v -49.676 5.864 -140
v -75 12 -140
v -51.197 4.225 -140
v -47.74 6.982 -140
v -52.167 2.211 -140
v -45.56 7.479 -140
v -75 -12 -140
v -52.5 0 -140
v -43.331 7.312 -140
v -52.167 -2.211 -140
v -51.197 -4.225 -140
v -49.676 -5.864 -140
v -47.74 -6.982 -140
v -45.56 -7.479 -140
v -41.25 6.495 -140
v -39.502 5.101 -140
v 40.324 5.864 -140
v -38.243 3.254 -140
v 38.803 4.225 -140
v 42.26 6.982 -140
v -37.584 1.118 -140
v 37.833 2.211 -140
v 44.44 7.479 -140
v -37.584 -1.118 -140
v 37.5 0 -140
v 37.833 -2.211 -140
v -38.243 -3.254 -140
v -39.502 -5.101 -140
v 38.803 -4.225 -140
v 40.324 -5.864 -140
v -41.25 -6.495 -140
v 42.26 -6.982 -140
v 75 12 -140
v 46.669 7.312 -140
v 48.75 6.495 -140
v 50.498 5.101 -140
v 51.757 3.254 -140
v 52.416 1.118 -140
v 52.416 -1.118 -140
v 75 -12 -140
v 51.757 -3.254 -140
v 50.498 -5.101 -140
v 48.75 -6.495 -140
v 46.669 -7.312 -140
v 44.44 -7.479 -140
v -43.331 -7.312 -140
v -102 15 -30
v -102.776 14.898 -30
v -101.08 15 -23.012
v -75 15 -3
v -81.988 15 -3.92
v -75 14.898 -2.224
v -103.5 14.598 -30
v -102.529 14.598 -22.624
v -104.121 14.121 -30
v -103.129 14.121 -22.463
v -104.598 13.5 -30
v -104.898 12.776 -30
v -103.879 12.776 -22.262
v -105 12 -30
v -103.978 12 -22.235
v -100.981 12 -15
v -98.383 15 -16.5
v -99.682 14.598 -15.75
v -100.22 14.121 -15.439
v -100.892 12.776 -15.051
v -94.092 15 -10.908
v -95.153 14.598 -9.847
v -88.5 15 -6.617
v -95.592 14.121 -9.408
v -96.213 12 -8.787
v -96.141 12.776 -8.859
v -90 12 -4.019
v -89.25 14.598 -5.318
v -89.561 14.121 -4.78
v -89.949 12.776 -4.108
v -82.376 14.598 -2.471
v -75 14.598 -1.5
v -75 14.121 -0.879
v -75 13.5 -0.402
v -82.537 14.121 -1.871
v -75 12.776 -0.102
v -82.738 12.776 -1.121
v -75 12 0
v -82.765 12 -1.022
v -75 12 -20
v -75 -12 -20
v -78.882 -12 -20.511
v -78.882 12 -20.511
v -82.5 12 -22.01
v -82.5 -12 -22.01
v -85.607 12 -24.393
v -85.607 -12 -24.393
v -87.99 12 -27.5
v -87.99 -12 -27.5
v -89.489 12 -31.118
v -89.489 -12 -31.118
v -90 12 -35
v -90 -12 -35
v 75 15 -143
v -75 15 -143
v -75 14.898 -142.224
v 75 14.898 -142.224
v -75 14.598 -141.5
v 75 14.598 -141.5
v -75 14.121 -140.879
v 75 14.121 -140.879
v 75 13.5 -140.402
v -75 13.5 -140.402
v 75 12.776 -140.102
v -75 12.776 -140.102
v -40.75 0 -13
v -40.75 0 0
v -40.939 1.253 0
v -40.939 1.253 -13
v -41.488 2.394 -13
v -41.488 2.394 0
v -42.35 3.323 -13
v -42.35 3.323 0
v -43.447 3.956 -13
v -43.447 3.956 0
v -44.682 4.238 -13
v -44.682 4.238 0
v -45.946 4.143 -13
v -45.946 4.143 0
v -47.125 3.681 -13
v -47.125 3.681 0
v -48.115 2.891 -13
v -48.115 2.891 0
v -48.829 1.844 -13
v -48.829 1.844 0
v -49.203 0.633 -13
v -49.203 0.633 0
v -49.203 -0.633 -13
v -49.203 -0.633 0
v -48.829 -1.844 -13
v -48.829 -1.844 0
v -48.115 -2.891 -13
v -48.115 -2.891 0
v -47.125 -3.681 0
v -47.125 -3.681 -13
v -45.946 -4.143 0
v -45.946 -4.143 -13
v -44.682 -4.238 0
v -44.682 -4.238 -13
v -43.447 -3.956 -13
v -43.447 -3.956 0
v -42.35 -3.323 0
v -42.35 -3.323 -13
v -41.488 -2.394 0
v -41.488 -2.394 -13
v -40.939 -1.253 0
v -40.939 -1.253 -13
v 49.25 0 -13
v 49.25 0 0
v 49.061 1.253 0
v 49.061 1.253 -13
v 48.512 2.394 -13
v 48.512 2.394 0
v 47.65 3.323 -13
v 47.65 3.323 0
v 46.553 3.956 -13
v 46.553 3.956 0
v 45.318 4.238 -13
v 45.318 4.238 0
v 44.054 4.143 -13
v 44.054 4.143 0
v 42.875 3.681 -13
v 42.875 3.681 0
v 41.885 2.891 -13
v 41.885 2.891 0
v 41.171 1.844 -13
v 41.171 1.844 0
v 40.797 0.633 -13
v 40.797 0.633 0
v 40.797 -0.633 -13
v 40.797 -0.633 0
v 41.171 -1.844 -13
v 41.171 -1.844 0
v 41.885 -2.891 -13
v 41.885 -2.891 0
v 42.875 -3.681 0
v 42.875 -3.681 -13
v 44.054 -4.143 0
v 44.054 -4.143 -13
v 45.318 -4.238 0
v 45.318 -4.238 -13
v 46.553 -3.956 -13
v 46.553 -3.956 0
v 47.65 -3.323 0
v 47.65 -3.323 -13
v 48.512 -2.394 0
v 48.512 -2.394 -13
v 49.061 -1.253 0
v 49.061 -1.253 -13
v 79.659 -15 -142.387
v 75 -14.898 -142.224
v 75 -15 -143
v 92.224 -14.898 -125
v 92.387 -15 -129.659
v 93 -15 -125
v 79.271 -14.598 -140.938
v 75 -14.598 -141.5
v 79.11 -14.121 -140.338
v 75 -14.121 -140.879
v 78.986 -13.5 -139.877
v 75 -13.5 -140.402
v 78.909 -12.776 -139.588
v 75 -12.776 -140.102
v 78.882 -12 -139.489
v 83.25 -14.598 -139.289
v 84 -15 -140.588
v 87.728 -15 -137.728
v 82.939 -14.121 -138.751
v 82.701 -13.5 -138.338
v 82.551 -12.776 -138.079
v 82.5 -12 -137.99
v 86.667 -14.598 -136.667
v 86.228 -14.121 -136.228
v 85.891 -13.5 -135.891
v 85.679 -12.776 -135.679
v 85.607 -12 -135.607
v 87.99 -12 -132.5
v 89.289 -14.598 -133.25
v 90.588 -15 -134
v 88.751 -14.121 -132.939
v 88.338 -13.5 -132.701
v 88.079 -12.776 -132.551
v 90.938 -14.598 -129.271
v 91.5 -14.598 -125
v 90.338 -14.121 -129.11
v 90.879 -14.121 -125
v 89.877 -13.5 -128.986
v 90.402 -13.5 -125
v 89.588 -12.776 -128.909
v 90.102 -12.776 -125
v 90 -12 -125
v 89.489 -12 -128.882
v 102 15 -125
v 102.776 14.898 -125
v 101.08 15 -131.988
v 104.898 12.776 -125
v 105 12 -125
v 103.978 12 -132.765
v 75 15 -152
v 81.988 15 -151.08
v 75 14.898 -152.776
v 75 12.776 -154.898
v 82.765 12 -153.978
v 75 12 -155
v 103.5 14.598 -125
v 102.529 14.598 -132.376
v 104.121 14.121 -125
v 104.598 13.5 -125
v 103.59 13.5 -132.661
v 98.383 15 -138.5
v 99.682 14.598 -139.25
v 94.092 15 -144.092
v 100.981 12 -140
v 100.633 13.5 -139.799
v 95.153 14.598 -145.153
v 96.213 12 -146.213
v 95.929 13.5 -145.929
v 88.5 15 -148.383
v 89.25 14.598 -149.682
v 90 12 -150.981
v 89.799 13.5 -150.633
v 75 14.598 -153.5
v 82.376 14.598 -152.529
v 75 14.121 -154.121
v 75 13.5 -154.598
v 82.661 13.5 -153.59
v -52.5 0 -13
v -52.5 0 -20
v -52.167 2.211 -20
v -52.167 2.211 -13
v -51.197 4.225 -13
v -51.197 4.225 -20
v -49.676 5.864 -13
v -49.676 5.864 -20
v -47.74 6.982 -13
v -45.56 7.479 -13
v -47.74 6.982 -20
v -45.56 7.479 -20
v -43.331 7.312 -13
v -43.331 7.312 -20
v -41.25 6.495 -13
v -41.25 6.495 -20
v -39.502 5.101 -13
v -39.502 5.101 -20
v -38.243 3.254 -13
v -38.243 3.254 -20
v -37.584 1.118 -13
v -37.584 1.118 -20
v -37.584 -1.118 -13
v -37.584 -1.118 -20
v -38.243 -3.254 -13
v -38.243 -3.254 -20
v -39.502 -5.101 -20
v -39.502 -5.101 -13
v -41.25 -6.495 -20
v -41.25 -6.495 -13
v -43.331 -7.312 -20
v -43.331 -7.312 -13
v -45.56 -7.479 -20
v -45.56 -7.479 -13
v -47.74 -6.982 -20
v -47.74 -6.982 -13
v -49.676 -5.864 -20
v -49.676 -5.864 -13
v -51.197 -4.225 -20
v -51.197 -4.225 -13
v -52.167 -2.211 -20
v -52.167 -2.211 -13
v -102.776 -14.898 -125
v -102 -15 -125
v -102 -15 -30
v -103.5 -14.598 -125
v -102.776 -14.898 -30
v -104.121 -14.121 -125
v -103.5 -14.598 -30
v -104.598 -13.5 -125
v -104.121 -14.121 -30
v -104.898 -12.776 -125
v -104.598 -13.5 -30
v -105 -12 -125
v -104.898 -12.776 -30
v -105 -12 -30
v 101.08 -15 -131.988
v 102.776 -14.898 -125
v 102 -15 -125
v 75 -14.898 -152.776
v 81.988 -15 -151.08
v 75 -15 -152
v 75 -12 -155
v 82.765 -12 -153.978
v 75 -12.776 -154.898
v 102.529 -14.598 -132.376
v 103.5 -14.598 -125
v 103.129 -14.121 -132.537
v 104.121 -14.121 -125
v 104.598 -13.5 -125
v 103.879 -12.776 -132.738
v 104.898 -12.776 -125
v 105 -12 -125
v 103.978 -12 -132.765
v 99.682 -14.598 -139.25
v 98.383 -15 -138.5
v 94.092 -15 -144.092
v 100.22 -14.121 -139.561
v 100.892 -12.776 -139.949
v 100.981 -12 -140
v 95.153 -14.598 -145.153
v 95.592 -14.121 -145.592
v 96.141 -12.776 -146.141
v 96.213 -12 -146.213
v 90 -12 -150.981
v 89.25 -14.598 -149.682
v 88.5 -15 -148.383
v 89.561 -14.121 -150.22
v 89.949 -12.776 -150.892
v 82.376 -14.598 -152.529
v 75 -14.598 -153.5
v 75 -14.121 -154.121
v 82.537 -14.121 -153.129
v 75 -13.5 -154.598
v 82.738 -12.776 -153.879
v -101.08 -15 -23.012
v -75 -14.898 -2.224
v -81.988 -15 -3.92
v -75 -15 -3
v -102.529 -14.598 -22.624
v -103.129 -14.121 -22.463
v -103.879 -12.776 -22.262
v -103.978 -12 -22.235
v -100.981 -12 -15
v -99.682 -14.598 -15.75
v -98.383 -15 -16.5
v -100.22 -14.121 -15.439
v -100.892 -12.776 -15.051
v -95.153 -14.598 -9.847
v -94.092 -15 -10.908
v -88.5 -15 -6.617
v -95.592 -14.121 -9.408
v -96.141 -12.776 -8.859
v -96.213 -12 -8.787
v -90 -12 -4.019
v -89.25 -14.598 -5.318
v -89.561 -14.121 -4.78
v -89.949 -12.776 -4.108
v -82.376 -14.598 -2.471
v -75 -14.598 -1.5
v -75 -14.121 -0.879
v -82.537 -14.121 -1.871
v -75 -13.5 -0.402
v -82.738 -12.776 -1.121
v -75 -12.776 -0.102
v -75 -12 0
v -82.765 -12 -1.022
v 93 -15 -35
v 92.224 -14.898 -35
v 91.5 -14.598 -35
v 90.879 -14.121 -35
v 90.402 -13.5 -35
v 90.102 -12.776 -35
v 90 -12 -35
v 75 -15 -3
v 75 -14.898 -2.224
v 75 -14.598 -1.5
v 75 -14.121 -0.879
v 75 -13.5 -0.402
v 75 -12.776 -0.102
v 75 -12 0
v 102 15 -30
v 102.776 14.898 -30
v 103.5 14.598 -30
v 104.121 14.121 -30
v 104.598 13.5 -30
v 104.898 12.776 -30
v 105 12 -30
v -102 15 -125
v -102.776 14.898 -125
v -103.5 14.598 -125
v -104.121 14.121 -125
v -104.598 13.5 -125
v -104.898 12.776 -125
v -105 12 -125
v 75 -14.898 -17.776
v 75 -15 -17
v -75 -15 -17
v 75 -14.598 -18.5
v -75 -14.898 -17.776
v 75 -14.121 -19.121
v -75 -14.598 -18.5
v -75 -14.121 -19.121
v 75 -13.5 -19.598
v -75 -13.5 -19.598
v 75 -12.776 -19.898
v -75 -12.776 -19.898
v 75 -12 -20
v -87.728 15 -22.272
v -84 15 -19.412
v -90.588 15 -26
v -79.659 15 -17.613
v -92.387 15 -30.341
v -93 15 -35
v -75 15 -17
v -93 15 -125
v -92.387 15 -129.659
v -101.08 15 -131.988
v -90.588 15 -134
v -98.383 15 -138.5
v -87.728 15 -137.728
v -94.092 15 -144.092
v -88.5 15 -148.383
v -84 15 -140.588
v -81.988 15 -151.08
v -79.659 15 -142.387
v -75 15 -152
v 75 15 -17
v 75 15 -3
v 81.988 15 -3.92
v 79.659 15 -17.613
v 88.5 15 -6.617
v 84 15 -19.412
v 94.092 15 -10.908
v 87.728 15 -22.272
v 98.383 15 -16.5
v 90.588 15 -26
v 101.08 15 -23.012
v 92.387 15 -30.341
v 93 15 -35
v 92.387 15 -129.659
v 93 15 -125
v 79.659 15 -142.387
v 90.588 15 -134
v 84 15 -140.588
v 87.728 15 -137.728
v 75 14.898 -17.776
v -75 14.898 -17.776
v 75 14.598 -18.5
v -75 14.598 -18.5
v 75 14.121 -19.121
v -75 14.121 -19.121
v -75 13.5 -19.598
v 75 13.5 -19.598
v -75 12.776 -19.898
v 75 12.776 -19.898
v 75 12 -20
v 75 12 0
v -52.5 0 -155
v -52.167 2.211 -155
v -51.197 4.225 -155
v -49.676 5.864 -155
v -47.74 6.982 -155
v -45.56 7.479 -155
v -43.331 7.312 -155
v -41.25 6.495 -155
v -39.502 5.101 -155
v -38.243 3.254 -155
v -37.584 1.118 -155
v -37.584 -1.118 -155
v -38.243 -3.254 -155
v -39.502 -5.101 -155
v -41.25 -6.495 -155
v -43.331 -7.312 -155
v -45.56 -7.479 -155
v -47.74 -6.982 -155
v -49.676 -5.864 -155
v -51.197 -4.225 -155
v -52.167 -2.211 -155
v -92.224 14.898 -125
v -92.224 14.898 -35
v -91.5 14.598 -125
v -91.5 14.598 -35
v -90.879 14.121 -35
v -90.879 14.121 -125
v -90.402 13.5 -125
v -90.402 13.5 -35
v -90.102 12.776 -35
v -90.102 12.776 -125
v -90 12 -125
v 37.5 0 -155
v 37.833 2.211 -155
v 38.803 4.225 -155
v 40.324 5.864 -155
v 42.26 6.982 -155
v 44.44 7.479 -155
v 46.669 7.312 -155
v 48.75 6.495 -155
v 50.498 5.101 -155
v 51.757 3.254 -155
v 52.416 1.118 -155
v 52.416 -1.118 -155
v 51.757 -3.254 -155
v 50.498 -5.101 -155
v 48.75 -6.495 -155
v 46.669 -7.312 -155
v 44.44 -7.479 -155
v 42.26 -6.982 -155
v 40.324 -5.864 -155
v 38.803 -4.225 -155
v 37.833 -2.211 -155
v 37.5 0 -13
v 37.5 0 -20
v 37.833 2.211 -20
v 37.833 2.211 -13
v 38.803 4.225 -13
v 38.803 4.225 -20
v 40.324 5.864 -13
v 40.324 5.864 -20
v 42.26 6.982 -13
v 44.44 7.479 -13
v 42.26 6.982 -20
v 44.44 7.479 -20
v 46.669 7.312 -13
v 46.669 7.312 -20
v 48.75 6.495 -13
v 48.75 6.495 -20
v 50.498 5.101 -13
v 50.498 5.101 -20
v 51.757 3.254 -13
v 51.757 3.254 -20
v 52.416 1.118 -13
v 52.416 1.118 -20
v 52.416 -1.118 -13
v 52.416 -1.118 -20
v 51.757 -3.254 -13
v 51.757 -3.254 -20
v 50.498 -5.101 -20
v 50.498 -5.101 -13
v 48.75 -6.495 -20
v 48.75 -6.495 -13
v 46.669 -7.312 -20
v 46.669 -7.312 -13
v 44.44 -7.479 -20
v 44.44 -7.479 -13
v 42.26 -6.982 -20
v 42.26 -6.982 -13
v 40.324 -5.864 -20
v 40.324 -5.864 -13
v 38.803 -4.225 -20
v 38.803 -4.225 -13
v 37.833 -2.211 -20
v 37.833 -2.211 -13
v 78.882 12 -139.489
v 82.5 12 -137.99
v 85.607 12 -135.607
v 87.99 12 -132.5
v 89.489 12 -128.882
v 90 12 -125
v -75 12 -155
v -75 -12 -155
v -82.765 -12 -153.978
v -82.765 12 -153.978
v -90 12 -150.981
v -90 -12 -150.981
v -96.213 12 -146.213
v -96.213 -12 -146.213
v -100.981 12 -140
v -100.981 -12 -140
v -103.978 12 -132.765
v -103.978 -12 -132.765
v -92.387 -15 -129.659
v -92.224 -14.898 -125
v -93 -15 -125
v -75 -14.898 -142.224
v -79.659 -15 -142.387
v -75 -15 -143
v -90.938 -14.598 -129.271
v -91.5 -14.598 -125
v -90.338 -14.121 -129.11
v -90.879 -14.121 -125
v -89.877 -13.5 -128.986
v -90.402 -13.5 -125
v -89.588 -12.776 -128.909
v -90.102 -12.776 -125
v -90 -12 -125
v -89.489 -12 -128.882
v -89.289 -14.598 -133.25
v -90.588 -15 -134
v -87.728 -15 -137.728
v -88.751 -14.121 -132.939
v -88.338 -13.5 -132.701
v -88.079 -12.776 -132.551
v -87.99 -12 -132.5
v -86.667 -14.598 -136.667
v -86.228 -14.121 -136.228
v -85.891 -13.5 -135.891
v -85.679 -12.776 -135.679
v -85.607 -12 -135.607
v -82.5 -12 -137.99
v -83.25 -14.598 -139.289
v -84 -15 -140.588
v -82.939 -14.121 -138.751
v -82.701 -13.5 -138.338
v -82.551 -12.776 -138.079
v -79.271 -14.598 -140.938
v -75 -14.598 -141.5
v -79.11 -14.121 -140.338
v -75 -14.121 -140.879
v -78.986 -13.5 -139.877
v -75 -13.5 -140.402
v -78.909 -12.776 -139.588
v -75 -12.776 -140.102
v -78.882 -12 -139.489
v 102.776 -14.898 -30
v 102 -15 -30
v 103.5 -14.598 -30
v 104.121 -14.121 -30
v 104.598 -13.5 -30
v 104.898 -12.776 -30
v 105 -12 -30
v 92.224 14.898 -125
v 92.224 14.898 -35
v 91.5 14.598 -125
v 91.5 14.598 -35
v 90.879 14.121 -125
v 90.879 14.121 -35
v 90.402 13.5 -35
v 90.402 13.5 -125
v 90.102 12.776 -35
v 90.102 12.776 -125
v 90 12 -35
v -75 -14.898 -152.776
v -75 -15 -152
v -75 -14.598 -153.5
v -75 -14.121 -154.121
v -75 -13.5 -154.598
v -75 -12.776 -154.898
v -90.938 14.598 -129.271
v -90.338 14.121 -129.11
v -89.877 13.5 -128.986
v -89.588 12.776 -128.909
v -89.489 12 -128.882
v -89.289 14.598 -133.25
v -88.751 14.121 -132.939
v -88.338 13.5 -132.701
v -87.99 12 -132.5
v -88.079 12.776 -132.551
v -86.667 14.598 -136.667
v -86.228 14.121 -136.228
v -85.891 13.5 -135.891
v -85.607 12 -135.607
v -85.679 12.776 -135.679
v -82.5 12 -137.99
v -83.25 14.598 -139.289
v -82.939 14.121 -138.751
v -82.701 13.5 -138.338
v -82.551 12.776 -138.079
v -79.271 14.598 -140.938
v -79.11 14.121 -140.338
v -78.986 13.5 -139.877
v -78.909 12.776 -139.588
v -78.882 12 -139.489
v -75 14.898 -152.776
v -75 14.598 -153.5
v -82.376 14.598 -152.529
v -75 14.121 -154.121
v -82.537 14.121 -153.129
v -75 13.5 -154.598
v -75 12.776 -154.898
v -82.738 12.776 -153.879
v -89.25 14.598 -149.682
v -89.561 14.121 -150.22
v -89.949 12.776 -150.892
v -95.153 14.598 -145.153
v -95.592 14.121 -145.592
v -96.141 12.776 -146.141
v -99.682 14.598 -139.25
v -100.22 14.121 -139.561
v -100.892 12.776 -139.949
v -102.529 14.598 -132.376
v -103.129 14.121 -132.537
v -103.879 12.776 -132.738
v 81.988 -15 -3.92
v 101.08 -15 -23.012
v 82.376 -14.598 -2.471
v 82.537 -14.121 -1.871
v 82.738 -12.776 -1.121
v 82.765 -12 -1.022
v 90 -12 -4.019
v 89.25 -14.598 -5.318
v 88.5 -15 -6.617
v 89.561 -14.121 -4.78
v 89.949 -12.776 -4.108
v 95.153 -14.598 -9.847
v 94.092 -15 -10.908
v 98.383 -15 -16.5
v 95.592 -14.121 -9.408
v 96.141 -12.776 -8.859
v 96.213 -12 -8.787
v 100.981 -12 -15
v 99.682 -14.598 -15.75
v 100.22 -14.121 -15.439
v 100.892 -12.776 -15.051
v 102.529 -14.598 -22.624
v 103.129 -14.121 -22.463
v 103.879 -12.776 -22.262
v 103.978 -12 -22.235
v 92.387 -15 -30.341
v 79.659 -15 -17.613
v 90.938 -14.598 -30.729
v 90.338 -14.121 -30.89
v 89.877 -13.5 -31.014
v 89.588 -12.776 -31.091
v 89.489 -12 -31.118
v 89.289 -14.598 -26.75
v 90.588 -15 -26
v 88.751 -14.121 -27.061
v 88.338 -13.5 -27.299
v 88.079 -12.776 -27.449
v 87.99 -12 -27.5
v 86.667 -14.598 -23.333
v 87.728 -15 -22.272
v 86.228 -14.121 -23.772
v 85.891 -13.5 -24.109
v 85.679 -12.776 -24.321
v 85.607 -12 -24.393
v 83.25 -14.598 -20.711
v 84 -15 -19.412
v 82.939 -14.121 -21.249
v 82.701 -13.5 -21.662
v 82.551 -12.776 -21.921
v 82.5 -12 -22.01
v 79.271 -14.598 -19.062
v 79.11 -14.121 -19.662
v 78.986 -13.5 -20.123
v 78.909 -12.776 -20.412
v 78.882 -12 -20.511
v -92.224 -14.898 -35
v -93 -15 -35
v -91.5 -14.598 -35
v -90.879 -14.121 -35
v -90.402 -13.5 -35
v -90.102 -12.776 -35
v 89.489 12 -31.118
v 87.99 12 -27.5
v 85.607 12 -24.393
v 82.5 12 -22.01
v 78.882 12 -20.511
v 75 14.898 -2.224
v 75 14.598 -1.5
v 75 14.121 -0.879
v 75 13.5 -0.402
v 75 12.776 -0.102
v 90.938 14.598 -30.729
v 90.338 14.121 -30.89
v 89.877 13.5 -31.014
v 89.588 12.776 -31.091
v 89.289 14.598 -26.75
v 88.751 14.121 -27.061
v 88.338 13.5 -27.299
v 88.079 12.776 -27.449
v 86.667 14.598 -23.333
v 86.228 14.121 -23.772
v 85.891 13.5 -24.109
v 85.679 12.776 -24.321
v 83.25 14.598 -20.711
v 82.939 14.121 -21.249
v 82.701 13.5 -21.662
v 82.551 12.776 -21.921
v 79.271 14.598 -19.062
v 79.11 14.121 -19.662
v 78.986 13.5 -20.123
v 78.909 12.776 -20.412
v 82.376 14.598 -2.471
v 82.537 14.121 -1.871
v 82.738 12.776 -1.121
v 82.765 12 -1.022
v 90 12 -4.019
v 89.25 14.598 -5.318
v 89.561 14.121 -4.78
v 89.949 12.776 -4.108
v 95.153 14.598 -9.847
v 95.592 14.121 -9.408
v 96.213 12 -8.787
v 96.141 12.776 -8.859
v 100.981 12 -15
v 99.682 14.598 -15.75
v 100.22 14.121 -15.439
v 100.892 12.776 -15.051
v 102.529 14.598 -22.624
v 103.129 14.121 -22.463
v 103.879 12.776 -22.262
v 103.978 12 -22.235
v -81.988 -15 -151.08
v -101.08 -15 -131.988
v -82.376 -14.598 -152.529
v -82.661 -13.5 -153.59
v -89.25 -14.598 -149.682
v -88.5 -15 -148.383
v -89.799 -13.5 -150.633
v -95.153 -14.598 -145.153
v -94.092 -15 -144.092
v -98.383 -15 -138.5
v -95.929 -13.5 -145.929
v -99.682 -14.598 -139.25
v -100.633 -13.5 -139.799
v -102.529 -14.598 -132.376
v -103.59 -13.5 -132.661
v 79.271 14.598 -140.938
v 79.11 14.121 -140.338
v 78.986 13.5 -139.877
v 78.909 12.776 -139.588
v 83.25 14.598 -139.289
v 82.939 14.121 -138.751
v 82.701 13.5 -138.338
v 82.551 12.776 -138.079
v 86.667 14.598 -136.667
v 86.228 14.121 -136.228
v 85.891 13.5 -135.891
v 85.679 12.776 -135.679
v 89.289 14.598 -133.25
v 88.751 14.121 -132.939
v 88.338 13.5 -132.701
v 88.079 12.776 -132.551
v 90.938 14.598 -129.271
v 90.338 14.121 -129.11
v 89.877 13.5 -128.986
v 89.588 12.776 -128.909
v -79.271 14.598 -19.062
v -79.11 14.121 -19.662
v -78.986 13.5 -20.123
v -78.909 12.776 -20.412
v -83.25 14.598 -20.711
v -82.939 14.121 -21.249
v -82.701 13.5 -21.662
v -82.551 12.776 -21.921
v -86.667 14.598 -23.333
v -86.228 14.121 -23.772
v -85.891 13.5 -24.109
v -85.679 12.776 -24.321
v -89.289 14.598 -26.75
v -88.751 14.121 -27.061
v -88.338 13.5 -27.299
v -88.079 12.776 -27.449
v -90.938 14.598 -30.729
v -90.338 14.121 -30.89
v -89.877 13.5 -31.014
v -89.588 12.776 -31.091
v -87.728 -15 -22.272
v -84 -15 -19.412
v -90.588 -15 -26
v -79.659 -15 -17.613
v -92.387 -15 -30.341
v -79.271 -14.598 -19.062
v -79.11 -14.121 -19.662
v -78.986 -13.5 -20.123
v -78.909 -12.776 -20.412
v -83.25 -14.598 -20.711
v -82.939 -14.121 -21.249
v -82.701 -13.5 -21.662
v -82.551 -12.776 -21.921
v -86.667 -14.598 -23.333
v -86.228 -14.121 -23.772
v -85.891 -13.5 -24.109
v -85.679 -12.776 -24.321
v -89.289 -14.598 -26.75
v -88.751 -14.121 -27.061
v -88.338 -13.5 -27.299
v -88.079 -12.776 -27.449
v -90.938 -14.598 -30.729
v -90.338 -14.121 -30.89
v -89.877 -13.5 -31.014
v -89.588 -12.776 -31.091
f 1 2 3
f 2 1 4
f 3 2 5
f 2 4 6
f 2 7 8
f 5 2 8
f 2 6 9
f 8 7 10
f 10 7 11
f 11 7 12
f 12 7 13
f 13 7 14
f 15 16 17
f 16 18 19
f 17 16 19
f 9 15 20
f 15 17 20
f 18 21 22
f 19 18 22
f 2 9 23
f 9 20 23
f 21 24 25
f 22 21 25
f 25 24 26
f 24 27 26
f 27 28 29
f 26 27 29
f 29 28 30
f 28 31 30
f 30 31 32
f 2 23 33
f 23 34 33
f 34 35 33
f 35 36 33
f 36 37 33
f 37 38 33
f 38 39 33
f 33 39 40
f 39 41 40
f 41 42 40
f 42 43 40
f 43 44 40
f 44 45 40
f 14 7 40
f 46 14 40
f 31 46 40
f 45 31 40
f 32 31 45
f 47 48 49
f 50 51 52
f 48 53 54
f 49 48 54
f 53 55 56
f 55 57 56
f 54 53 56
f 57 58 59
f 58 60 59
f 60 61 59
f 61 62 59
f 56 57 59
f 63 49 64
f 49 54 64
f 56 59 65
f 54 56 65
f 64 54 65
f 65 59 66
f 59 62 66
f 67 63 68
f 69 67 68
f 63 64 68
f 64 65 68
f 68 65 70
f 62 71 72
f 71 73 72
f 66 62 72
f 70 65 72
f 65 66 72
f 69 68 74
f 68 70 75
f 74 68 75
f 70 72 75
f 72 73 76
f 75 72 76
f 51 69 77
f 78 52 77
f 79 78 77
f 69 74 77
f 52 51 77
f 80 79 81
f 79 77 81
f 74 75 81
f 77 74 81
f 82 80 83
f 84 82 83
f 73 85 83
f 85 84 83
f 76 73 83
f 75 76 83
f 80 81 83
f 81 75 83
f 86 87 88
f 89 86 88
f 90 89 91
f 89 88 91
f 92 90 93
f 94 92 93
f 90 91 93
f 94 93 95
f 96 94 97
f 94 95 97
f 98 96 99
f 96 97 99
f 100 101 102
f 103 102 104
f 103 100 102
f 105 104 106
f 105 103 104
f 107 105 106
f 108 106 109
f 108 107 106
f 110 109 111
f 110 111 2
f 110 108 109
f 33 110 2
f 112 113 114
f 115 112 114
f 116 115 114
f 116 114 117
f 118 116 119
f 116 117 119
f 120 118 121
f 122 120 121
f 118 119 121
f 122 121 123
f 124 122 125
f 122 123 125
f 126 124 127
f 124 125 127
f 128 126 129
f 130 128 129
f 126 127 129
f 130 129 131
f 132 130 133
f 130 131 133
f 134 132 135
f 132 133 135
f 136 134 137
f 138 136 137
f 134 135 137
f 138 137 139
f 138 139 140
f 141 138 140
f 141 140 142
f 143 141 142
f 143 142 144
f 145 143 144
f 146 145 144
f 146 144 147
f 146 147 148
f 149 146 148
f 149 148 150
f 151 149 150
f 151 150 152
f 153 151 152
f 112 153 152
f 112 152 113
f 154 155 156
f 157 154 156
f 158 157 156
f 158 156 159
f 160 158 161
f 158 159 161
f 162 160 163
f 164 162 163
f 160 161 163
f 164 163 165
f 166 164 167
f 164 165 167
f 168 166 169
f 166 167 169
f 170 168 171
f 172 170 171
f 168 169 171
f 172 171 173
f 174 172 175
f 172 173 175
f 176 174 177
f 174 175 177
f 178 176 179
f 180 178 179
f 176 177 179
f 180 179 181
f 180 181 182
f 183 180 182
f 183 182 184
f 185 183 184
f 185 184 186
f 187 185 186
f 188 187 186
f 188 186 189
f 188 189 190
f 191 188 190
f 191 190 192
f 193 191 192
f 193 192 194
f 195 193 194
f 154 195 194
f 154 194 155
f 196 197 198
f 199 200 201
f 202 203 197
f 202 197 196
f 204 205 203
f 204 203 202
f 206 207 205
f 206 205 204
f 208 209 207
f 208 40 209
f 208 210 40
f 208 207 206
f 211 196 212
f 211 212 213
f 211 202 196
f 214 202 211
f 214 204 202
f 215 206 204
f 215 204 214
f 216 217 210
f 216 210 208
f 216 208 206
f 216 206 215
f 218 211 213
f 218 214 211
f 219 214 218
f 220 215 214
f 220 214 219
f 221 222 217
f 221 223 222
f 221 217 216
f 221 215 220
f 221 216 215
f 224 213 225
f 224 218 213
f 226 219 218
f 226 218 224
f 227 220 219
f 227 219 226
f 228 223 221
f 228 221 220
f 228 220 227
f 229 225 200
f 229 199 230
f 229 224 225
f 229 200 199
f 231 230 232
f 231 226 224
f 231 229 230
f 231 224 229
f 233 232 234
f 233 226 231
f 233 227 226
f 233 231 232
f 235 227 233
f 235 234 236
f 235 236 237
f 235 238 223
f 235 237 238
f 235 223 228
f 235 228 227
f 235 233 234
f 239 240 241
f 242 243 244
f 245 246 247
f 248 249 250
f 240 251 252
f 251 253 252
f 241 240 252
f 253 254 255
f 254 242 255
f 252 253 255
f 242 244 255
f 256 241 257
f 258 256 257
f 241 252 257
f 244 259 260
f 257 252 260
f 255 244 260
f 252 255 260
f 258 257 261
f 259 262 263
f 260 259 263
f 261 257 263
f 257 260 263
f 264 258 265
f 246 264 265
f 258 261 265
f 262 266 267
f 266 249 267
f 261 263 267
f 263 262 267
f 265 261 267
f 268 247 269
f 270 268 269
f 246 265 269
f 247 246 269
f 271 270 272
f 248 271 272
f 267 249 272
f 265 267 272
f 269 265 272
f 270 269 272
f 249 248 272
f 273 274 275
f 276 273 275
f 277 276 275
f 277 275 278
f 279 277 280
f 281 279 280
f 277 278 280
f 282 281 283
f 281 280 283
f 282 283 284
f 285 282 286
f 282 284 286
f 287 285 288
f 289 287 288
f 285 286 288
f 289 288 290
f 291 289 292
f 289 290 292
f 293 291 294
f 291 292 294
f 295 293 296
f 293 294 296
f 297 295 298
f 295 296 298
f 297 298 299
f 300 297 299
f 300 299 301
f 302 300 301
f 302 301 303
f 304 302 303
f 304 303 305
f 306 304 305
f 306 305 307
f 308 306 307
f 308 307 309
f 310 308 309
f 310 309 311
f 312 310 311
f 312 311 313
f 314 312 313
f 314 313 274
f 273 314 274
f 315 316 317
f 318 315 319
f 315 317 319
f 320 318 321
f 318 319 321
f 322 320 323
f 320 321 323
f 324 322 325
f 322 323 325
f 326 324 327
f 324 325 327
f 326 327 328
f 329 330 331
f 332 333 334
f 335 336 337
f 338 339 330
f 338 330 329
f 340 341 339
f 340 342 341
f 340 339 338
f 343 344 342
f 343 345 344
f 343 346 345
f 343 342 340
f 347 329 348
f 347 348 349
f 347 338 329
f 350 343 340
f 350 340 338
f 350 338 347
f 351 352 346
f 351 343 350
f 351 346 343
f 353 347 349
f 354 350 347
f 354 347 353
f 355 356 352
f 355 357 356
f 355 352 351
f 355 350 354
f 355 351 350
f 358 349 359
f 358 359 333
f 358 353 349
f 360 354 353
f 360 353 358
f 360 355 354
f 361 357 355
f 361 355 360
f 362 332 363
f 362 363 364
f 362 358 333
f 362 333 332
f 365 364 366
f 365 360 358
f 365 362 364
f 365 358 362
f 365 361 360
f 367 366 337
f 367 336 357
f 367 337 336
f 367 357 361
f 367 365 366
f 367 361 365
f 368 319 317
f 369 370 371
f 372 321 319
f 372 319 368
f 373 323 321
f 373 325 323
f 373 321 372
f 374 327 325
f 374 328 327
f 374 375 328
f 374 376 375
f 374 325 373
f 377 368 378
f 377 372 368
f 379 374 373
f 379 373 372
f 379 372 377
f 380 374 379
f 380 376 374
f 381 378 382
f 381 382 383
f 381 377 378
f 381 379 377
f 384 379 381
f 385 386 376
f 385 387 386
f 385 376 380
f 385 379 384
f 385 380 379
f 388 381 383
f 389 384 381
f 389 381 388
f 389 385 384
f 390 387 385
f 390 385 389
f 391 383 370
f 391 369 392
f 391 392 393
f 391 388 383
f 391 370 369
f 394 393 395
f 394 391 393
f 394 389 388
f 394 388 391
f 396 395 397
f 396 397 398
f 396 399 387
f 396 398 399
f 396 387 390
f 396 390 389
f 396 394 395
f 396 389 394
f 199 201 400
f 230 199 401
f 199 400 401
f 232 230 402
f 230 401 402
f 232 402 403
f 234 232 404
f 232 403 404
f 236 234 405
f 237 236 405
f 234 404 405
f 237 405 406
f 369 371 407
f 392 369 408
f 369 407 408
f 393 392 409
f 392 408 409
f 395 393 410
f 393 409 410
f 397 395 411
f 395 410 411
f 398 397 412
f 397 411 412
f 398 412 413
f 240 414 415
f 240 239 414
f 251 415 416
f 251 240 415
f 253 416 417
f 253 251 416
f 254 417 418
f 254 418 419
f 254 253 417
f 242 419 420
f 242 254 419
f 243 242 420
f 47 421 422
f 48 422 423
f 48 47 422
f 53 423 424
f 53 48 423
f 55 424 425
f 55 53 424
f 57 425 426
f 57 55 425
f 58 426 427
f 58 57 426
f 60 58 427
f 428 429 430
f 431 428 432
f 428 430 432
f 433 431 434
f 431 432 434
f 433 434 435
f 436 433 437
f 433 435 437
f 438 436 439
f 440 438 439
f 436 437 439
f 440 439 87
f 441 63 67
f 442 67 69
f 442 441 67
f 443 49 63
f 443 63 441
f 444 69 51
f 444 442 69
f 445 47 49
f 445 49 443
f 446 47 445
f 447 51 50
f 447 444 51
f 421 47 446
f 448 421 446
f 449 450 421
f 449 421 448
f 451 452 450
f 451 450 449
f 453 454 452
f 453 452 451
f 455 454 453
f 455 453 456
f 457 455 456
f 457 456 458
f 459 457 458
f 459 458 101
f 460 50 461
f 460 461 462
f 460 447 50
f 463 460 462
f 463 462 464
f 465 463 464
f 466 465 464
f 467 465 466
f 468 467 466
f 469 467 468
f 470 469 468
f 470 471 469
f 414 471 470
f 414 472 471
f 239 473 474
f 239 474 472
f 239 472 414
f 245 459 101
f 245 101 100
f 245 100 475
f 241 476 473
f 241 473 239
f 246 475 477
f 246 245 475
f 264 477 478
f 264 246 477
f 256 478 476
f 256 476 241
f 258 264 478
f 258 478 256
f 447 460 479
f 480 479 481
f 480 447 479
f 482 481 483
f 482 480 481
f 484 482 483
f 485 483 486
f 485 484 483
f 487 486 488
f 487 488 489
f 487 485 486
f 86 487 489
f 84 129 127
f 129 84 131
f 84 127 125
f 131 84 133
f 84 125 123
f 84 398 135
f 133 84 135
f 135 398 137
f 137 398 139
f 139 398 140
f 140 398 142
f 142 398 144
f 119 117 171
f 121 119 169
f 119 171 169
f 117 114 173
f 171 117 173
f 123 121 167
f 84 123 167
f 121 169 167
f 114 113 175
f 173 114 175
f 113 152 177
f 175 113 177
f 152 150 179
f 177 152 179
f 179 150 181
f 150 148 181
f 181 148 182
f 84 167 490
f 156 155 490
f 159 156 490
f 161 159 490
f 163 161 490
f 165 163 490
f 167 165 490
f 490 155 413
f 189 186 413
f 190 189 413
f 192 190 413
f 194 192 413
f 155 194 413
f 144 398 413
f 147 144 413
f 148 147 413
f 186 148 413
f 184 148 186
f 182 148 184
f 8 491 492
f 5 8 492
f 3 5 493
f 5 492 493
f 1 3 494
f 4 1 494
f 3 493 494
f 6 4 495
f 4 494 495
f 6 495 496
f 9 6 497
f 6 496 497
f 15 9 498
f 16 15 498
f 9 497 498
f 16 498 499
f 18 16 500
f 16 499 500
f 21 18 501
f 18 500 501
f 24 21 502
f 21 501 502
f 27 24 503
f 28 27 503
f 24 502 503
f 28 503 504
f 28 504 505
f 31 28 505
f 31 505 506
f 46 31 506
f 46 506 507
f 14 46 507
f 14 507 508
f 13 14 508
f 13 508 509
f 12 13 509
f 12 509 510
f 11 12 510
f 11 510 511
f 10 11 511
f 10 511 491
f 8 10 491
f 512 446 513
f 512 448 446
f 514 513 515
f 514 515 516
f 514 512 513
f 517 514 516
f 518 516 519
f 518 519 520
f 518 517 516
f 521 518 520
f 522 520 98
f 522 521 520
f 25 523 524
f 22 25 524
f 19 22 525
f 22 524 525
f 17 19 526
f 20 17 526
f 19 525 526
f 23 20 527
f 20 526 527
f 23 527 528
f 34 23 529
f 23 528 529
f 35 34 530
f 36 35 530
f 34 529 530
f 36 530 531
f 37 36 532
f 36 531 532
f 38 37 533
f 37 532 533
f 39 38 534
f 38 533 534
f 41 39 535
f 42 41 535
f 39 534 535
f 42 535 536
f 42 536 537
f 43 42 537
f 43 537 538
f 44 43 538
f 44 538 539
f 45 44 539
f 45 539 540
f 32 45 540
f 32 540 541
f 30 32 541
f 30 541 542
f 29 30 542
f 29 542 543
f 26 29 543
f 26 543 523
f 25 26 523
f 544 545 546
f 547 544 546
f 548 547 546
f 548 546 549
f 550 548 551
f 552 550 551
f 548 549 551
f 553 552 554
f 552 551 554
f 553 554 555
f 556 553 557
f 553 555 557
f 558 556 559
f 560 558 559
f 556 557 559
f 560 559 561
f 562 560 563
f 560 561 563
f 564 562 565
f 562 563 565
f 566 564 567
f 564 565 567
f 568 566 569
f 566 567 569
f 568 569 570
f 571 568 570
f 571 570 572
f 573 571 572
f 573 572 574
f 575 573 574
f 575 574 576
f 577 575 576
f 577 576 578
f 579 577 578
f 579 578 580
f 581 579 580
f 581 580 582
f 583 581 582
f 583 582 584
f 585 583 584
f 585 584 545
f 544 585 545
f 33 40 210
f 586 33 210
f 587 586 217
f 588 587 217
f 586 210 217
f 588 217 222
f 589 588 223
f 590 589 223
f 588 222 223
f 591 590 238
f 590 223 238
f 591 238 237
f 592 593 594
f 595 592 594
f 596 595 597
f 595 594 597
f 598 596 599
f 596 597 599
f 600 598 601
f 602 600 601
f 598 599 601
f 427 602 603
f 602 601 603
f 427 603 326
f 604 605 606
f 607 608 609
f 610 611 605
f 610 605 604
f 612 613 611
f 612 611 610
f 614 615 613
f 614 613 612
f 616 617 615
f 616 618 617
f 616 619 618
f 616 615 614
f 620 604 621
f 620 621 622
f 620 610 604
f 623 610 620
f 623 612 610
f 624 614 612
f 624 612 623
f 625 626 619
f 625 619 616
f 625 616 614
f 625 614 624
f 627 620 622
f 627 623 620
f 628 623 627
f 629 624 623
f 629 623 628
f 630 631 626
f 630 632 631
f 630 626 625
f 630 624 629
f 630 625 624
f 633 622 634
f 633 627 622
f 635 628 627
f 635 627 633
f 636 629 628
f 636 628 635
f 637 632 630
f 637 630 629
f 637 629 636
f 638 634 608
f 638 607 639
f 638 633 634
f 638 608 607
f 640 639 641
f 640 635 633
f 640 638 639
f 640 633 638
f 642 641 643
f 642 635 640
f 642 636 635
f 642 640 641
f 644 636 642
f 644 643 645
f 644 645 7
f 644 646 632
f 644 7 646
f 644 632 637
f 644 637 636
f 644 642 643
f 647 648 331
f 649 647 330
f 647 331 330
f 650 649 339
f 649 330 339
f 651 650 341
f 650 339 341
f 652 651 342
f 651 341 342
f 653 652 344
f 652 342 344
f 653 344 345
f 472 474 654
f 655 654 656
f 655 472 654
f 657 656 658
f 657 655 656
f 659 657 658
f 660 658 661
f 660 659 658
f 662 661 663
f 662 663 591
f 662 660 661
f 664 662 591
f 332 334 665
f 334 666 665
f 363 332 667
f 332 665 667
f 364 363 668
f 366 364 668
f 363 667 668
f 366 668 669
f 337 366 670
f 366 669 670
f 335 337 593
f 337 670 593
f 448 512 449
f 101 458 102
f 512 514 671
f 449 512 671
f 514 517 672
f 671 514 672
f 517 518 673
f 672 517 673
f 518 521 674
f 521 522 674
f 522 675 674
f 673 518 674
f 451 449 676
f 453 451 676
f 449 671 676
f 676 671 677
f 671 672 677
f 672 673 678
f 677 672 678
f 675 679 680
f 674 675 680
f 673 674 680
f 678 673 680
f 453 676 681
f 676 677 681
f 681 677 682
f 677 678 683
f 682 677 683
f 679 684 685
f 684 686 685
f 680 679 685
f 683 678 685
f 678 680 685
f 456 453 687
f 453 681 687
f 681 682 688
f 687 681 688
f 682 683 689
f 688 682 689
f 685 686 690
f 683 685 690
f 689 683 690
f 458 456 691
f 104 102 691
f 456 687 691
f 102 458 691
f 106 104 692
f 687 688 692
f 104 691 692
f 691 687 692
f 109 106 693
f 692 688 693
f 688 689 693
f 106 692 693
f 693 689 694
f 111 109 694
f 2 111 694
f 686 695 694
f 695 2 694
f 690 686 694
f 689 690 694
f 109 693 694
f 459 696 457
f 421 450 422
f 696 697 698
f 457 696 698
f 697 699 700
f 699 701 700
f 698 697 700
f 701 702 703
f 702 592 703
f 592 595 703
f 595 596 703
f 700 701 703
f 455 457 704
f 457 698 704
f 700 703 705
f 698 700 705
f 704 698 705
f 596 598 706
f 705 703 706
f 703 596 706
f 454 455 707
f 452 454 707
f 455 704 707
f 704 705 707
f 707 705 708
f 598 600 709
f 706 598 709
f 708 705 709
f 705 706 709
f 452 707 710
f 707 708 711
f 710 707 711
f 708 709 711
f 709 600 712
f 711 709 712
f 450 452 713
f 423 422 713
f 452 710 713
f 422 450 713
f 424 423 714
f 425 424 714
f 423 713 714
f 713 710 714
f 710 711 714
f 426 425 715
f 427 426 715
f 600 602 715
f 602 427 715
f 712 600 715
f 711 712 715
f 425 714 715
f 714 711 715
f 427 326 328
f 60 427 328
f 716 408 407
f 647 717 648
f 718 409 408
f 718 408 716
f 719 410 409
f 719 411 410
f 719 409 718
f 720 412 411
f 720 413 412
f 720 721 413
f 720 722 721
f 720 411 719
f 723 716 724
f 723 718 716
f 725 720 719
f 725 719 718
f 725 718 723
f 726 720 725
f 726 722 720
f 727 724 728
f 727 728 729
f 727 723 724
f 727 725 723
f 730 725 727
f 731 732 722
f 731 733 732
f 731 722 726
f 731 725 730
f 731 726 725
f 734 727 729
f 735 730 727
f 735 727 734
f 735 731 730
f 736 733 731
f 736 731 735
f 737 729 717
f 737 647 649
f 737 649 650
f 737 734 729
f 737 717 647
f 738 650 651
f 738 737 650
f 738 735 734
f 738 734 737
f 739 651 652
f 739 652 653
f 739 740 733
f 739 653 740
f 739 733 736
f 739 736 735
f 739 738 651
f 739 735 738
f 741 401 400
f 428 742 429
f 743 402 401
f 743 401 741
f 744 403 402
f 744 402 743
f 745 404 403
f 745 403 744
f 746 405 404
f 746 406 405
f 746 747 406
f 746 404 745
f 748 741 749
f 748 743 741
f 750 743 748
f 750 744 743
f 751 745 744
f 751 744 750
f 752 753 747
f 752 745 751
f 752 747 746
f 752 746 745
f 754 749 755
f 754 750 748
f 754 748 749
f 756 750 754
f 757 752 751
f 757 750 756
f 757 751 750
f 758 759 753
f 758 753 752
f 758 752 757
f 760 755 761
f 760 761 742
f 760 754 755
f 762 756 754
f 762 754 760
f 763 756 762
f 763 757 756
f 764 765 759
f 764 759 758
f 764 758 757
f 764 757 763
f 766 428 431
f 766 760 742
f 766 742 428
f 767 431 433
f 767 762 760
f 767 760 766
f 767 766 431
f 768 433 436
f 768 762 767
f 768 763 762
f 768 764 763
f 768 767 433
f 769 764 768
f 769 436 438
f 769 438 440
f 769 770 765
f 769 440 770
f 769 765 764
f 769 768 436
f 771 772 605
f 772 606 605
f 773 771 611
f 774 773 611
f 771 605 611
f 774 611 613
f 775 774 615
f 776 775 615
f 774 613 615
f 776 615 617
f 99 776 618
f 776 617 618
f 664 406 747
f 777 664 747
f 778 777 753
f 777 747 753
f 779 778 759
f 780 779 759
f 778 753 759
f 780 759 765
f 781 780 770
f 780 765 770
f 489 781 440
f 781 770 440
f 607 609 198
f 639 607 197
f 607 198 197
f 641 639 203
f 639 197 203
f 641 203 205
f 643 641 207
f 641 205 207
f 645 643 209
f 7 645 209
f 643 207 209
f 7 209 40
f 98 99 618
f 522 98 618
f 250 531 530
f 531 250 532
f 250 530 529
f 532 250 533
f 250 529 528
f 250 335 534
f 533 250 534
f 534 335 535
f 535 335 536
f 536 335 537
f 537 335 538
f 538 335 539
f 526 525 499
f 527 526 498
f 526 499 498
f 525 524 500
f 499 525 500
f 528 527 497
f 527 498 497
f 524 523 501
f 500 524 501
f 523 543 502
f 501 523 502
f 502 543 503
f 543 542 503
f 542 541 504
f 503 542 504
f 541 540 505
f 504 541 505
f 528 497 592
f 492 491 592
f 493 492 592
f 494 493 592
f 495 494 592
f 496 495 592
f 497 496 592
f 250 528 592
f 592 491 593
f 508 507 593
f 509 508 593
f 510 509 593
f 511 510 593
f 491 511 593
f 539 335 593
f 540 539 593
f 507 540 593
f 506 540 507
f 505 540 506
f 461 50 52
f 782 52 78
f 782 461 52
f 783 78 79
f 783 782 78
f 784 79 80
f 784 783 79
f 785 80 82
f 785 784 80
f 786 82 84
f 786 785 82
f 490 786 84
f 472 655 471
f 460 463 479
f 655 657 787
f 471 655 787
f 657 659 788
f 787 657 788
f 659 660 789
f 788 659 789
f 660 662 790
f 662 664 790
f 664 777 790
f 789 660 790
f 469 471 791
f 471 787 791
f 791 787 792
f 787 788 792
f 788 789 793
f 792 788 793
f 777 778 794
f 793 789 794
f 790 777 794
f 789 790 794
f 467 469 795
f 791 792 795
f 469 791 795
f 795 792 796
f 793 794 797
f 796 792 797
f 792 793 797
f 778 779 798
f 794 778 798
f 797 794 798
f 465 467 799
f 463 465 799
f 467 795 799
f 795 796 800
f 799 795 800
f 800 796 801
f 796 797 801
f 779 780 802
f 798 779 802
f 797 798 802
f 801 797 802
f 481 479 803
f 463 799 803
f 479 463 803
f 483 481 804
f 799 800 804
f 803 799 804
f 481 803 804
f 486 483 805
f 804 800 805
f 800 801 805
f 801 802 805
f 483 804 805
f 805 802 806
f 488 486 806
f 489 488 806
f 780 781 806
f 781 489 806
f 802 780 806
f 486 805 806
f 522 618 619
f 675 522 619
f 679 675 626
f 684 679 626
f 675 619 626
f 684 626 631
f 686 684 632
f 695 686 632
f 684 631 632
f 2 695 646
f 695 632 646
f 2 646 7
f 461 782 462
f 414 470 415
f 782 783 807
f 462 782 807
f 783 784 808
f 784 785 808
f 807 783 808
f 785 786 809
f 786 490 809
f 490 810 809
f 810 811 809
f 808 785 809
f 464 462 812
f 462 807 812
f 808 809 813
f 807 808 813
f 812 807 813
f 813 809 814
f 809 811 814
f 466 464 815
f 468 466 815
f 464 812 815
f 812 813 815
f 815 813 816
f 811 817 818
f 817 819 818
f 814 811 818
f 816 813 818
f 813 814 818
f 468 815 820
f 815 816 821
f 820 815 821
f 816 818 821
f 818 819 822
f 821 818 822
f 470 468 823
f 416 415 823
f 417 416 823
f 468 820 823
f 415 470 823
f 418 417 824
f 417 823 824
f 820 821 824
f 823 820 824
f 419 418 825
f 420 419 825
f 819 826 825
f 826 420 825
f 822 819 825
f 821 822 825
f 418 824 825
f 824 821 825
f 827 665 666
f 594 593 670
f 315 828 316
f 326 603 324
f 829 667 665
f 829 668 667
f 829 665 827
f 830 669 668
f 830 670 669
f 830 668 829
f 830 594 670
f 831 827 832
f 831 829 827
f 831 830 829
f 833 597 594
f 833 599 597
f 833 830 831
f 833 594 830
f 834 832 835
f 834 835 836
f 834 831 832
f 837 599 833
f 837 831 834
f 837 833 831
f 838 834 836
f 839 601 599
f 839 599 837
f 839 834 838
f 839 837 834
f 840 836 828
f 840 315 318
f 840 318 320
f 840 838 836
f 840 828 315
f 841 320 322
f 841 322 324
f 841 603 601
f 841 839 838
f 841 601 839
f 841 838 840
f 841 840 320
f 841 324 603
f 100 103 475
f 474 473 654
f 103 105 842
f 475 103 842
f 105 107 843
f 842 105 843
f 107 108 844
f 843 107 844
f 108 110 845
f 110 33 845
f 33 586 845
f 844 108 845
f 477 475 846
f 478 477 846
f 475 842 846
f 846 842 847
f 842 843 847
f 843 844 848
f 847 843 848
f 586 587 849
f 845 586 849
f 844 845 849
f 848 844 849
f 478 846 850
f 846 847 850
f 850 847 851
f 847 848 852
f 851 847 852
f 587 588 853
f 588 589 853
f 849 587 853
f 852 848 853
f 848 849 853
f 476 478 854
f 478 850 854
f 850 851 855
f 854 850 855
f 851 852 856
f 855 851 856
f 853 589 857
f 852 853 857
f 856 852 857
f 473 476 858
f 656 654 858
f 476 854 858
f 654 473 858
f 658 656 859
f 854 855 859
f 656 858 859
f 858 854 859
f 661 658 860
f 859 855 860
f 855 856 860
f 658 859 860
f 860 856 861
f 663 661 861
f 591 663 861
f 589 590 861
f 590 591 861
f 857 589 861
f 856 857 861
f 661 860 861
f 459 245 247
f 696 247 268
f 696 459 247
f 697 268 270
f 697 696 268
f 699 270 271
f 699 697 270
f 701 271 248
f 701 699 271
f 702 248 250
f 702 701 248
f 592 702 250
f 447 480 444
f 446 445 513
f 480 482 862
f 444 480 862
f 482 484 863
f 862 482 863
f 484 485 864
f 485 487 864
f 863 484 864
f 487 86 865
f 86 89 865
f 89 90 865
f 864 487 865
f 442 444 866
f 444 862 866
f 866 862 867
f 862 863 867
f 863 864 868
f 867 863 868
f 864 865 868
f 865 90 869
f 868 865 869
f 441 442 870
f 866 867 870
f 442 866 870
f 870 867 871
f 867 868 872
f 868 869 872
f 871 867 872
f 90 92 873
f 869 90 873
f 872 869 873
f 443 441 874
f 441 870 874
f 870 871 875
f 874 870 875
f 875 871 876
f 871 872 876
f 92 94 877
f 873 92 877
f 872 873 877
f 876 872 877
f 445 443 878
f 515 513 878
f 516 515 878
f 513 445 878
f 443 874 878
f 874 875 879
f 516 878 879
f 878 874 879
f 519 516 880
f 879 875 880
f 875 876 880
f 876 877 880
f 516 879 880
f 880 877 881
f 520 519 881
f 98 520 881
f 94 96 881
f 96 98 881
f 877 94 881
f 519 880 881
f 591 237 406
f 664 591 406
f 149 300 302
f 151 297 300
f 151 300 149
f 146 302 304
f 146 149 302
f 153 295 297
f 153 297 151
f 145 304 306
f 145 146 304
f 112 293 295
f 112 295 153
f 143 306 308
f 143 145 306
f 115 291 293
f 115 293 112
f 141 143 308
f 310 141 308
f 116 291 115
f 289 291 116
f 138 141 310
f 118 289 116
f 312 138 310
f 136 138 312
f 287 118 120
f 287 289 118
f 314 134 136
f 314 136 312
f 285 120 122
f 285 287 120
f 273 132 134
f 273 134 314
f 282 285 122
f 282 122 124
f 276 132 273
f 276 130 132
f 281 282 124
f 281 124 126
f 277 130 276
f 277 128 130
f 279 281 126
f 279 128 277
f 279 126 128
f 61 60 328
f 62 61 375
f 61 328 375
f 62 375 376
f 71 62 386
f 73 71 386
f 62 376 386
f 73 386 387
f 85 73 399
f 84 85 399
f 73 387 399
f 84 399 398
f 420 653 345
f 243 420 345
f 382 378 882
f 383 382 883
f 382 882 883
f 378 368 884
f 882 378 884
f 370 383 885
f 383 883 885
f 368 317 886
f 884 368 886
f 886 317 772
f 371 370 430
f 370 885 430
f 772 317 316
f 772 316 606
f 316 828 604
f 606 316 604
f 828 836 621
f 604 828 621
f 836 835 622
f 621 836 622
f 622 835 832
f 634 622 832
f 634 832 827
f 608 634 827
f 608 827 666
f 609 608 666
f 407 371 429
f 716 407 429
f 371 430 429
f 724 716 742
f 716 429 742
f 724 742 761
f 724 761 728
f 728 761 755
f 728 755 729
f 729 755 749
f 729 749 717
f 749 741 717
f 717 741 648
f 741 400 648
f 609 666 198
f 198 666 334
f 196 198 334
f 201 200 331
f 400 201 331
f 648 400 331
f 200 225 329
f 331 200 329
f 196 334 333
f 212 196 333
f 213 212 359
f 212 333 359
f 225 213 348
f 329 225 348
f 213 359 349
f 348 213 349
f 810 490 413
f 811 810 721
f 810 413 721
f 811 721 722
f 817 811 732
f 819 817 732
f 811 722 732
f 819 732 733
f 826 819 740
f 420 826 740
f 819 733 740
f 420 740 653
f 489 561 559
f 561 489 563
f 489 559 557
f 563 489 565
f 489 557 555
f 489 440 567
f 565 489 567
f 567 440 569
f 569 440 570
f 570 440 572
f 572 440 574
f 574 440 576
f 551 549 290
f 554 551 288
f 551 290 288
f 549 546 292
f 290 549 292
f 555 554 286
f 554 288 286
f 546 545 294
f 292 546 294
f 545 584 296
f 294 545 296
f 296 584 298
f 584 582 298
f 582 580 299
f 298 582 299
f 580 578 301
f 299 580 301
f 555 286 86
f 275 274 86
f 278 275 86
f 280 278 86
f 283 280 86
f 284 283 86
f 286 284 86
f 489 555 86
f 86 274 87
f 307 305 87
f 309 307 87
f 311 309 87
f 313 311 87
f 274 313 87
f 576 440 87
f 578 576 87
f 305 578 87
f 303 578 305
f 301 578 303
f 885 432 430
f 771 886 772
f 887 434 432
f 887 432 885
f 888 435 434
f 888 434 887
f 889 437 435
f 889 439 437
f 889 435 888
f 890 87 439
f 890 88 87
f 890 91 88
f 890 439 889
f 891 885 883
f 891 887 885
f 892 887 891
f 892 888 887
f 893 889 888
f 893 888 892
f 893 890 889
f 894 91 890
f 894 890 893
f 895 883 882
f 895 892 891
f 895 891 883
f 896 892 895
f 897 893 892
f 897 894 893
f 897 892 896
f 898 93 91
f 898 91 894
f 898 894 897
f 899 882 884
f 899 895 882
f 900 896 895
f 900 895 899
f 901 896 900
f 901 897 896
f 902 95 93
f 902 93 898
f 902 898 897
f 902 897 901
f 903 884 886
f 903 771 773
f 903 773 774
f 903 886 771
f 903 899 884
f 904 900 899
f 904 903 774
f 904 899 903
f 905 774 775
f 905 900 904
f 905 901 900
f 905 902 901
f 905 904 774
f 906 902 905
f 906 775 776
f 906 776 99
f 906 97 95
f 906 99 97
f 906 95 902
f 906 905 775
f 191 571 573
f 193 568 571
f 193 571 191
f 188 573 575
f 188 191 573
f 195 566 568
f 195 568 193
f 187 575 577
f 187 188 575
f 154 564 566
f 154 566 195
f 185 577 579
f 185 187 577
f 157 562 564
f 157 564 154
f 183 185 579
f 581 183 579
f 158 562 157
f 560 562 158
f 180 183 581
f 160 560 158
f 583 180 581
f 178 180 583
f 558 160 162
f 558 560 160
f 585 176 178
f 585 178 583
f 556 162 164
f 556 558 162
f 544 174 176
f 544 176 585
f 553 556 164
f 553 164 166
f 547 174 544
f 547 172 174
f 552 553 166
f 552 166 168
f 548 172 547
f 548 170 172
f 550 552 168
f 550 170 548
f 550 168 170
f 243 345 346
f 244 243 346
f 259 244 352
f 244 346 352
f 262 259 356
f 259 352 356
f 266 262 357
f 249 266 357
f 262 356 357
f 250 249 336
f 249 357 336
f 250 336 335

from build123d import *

# Parameters (mm, degrees)
BOSS_EXTRUDE1_DEPTH      = 15
BOSS_EXTRUDE1_DEPTH_BACK = 15
SKETCH2_R                = 4.25
CUT_EXTRUDE1_DEPTH       = 120
SKETCH3_R                = 7.5
CUT_EXTRUDE2_DEPTH       = 142
FILLET1_R                = 3


with BuildPart() as part:
    # Sketch1 → Boss-Extrude1 (new, two sides: drawn at the far end of the back side and taken through both)
    with BuildSketch(Plane(origin=(0, 0, 0), x_dir=(1, 0, 0), z_dir=(0, 1, 0)).offset(-BOSS_EXTRUDE1_DEPTH_BACK)):
        with BuildLine():
            Line((-75, 0), (75, 0))
            ThreePointArc((75, 0), (96.213203436, 8.786796564), (105, 30))
            Line((105, 30), (105, 125))
            ThreePointArc((105, 125), (96.213203436, 146.213203436), (75, 155))
            Line((75, 155), (-75, 155))
            ThreePointArc((-75, 155), (-96.213203436, 146.213203436), (-105, 125))
            Line((-105, 125), (-105, 30))
            ThreePointArc((-105, 30), (-96.213203436, 8.786796564), (-75, 0))
        make_face()
        with BuildLine():
            Line((-75, 140), (75, 140))
            ThreePointArc((75, 140), (85.606601718, 135.606601718), (90, 125))
            Line((90, 125), (90, 35))
            ThreePointArc((90, 35), (85.606601718, 24.393398282), (75, 20))
            Line((75, 20), (-75, 20))
            ThreePointArc((-75, 20), (-85.606601718, 24.393398282), (-90, 35))
            Line((-90, 35), (-90, 125))
            ThreePointArc((-90, 125), (-85.606601718, 135.606601718), (-75, 140))
        make_face(mode=Mode.SUBTRACT)
    extrude(amount=BOSS_EXTRUDE1_DEPTH + BOSS_EXTRUDE1_DEPTH_BACK)

    # Sketch2 → Cut-Extrude1 (cut)
    with BuildSketch(Plane.XY):
        with Locations((45, 0)):
            Circle(SKETCH2_R)
        with Locations((-45, 0)):
            Circle(SKETCH2_R)
    extrude(amount=-CUT_EXTRUDE1_DEPTH, mode=Mode.SUBTRACT)

    # Sketch3 → Cut-Extrude2 (cut)
    with BuildSketch(Plane(origin=(0, 0, -155), x_dir=(-1, 0, 0), z_dir=(0, 0, -1))):
        with Locations((45, 0)):
            Circle(SKETCH3_R)
        with Locations((-45, 0)):
            Circle(SKETCH3_R)
    extrude(amount=-CUT_EXTRUDE2_DEPTH, mode=Mode.SUBTRACT)

    # Fillet1
    fillet1_edges = [part.edges().sort_by_distance(p)[0] for p in [
        (-96.213203436, -15, -146.213203436),
        (-105, -15, -77.5),
        (-96.213203436, -15, -8.786796564),
        (0, -15, 0),
        (-85.606601718, -15, -135.606601718),
        (0, -15, -140),
        (85.606601718, -15, -135.606601718),
        (90, -15, -80),
        (96.213203436, -15, -8.786796564),
        (85.606601718, -15, -24.393398282),
        (0, -15, -20),
        (-85.606601718, -15, -24.393398282),
        (-90, -15, -80),
        (105, -15, -77.5),
        (96.213203436, 15, -146.213203436),
        (0, 15, -155),
        (-96.213203436, 15, -146.213203436),
        (-105, 15, -77.5),
        (-96.213203436, 15, -8.786796564),
        (0, 15, 0),
        (96.213203436, 15, -8.786796564),
        (105, 15, -77.5),
        (96.213203436, -15, -146.213203436),
        (-85.606601718, 15, -135.606601718),
        (-90, 15, -80),
        (-85.606601718, 15, -24.393398282),
        (0, 15, -20),
        (85.606601718, 15, -24.393398282),
        (90, 15, -80),
        (85.606601718, 15, -135.606601718),
        (0, 15, -140),
        (0, -15, -155),
    ]]
    fillet(fillet1_edges, radius=FILLET1_R)


solid = part.part
